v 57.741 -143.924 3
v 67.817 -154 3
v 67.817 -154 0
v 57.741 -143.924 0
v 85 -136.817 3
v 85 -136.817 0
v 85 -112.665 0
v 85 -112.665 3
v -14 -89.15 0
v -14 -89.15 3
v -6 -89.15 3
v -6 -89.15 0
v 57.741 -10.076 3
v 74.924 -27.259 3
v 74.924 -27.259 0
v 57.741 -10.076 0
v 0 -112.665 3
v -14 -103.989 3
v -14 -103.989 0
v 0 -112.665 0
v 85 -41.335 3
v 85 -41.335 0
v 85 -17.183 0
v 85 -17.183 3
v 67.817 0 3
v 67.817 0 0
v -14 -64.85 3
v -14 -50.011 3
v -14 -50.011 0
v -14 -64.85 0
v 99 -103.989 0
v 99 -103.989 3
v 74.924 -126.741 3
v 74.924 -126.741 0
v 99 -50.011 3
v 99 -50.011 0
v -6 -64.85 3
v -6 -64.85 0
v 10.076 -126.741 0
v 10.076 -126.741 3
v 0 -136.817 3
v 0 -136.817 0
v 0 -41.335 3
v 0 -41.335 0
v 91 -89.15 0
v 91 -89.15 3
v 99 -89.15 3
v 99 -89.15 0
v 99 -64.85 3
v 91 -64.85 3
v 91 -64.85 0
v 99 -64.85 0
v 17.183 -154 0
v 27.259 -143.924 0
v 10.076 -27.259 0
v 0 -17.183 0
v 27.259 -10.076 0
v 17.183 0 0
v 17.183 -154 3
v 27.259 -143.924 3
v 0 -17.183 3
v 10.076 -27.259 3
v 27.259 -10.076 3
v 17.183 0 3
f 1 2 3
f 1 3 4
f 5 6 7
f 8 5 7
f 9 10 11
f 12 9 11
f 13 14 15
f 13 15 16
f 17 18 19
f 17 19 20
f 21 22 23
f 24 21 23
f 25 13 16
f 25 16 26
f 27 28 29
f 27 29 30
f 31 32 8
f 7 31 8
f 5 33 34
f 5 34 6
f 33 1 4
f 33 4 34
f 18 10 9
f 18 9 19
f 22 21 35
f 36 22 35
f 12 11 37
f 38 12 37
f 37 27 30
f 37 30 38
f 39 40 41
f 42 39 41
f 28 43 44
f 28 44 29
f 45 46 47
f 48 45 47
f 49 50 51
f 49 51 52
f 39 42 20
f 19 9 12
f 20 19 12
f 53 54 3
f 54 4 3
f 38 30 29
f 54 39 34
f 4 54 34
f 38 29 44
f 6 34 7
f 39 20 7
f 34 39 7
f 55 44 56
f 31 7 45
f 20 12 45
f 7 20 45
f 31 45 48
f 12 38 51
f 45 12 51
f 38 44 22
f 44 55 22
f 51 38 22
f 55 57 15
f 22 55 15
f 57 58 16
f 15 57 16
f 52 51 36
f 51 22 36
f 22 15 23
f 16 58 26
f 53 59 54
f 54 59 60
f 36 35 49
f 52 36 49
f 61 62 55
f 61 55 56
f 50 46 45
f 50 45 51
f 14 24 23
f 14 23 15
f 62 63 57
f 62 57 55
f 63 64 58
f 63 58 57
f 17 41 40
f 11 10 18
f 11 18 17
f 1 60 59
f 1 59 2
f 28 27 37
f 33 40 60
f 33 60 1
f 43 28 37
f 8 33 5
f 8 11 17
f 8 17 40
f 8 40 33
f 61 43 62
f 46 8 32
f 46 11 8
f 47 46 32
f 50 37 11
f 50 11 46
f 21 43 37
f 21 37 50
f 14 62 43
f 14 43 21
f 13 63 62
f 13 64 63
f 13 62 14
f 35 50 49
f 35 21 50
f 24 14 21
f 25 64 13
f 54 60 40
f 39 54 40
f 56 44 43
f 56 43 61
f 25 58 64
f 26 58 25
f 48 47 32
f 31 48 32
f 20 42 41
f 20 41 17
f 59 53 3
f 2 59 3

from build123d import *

# Parameters (mm, degrees)
SKETCH_1_W          = 85
SKETCH_1_H          = 154
EXTRUDE_1_DEPTH     = 3
CUT_EXTRUDE_2_DEPTH = 58
EXTRUDE_2_DEPTH     = 3
SKETCH_4_W          = 44.4
SKETCH_4_H          = 24.3
CUT_EXTRUDE_3_DEPTH = 58


with BuildPart() as part:
    # 草图1 → 凸台-拉伸1 (new body)
    with BuildSketch(Plane.XY):
        with Locations((42.5, -77)):
            Rectangle(SKETCH_1_W, SKETCH_1_H)
    extrude(amount=EXTRUDE_1_DEPTH)

    # 草图2 → 切除-拉伸2 (cut)
    with BuildSketch(Plane.XY.offset(3)):
        Polygon((10.076271632, -27.258966415), (-21.319269453, 4.13657467), (-4.13657467, 21.319269453), (27.258966415, -10.076271632), align=None)
        Polygon((-21.319269453, -158.13657467), (-4.13657467, -175.319269453), (27.258966415, -143.923728368), (10.076271632, -126.741033585), align=None)
        Polygon((74.923728368, -126.741033585), (106.319269453, -158.13657467), (89.13657467, -175.319269453), (57.741033585, -143.923728368), align=None)
        Polygon((74.923728368, -27.258966415), (57.741033585, -10.076271632), (89.13657467, 21.319269453), (106.319269453, 4.13657467), align=None)
        Polygon((85, -41.334617867), (99, -50.011428212), (99, -103.988571788), (85, -112.665382133), align=None)
        Polygon((0, -41.334617867), (-14, -50.011428212), (-14, -103.988571788), (0, -112.665382133), align=None)
    extrude(amount=-CUT_EXTRUDE_2_DEPTH, mode=Mode.SUBTRACT)

    # 草图3 → 凸台-拉伸2 (add)
    with BuildSketch(Plane.XY.offset(3)):
        Polygon((85, -41.334617867), (99, -50.011428212), (99, -103.988571788), (85, -112.665382133), align=None)
        Polygon((-14, -103.988571788), (0, -112.665382133), (0, -41.334617867), (-14, -50.011428212), align=None)
    extrude(amount=-EXTRUDE_2_DEPTH)

    # 草图4 → 切除-拉伸3 (cut)
    with BuildSketch(Plane.XY.offset(3)):
        with Locations((113.2, -77)):
            Rectangle(SKETCH_4_W, SKETCH_4_H)
        with Locations((-28.2, -77)):
            Rectangle(SKETCH_4_W, SKETCH_4_H)
    extrude(amount=-CUT_EXTRUDE_3_DEPTH, mode=Mode.SUBTRACT)


solid = part.part
